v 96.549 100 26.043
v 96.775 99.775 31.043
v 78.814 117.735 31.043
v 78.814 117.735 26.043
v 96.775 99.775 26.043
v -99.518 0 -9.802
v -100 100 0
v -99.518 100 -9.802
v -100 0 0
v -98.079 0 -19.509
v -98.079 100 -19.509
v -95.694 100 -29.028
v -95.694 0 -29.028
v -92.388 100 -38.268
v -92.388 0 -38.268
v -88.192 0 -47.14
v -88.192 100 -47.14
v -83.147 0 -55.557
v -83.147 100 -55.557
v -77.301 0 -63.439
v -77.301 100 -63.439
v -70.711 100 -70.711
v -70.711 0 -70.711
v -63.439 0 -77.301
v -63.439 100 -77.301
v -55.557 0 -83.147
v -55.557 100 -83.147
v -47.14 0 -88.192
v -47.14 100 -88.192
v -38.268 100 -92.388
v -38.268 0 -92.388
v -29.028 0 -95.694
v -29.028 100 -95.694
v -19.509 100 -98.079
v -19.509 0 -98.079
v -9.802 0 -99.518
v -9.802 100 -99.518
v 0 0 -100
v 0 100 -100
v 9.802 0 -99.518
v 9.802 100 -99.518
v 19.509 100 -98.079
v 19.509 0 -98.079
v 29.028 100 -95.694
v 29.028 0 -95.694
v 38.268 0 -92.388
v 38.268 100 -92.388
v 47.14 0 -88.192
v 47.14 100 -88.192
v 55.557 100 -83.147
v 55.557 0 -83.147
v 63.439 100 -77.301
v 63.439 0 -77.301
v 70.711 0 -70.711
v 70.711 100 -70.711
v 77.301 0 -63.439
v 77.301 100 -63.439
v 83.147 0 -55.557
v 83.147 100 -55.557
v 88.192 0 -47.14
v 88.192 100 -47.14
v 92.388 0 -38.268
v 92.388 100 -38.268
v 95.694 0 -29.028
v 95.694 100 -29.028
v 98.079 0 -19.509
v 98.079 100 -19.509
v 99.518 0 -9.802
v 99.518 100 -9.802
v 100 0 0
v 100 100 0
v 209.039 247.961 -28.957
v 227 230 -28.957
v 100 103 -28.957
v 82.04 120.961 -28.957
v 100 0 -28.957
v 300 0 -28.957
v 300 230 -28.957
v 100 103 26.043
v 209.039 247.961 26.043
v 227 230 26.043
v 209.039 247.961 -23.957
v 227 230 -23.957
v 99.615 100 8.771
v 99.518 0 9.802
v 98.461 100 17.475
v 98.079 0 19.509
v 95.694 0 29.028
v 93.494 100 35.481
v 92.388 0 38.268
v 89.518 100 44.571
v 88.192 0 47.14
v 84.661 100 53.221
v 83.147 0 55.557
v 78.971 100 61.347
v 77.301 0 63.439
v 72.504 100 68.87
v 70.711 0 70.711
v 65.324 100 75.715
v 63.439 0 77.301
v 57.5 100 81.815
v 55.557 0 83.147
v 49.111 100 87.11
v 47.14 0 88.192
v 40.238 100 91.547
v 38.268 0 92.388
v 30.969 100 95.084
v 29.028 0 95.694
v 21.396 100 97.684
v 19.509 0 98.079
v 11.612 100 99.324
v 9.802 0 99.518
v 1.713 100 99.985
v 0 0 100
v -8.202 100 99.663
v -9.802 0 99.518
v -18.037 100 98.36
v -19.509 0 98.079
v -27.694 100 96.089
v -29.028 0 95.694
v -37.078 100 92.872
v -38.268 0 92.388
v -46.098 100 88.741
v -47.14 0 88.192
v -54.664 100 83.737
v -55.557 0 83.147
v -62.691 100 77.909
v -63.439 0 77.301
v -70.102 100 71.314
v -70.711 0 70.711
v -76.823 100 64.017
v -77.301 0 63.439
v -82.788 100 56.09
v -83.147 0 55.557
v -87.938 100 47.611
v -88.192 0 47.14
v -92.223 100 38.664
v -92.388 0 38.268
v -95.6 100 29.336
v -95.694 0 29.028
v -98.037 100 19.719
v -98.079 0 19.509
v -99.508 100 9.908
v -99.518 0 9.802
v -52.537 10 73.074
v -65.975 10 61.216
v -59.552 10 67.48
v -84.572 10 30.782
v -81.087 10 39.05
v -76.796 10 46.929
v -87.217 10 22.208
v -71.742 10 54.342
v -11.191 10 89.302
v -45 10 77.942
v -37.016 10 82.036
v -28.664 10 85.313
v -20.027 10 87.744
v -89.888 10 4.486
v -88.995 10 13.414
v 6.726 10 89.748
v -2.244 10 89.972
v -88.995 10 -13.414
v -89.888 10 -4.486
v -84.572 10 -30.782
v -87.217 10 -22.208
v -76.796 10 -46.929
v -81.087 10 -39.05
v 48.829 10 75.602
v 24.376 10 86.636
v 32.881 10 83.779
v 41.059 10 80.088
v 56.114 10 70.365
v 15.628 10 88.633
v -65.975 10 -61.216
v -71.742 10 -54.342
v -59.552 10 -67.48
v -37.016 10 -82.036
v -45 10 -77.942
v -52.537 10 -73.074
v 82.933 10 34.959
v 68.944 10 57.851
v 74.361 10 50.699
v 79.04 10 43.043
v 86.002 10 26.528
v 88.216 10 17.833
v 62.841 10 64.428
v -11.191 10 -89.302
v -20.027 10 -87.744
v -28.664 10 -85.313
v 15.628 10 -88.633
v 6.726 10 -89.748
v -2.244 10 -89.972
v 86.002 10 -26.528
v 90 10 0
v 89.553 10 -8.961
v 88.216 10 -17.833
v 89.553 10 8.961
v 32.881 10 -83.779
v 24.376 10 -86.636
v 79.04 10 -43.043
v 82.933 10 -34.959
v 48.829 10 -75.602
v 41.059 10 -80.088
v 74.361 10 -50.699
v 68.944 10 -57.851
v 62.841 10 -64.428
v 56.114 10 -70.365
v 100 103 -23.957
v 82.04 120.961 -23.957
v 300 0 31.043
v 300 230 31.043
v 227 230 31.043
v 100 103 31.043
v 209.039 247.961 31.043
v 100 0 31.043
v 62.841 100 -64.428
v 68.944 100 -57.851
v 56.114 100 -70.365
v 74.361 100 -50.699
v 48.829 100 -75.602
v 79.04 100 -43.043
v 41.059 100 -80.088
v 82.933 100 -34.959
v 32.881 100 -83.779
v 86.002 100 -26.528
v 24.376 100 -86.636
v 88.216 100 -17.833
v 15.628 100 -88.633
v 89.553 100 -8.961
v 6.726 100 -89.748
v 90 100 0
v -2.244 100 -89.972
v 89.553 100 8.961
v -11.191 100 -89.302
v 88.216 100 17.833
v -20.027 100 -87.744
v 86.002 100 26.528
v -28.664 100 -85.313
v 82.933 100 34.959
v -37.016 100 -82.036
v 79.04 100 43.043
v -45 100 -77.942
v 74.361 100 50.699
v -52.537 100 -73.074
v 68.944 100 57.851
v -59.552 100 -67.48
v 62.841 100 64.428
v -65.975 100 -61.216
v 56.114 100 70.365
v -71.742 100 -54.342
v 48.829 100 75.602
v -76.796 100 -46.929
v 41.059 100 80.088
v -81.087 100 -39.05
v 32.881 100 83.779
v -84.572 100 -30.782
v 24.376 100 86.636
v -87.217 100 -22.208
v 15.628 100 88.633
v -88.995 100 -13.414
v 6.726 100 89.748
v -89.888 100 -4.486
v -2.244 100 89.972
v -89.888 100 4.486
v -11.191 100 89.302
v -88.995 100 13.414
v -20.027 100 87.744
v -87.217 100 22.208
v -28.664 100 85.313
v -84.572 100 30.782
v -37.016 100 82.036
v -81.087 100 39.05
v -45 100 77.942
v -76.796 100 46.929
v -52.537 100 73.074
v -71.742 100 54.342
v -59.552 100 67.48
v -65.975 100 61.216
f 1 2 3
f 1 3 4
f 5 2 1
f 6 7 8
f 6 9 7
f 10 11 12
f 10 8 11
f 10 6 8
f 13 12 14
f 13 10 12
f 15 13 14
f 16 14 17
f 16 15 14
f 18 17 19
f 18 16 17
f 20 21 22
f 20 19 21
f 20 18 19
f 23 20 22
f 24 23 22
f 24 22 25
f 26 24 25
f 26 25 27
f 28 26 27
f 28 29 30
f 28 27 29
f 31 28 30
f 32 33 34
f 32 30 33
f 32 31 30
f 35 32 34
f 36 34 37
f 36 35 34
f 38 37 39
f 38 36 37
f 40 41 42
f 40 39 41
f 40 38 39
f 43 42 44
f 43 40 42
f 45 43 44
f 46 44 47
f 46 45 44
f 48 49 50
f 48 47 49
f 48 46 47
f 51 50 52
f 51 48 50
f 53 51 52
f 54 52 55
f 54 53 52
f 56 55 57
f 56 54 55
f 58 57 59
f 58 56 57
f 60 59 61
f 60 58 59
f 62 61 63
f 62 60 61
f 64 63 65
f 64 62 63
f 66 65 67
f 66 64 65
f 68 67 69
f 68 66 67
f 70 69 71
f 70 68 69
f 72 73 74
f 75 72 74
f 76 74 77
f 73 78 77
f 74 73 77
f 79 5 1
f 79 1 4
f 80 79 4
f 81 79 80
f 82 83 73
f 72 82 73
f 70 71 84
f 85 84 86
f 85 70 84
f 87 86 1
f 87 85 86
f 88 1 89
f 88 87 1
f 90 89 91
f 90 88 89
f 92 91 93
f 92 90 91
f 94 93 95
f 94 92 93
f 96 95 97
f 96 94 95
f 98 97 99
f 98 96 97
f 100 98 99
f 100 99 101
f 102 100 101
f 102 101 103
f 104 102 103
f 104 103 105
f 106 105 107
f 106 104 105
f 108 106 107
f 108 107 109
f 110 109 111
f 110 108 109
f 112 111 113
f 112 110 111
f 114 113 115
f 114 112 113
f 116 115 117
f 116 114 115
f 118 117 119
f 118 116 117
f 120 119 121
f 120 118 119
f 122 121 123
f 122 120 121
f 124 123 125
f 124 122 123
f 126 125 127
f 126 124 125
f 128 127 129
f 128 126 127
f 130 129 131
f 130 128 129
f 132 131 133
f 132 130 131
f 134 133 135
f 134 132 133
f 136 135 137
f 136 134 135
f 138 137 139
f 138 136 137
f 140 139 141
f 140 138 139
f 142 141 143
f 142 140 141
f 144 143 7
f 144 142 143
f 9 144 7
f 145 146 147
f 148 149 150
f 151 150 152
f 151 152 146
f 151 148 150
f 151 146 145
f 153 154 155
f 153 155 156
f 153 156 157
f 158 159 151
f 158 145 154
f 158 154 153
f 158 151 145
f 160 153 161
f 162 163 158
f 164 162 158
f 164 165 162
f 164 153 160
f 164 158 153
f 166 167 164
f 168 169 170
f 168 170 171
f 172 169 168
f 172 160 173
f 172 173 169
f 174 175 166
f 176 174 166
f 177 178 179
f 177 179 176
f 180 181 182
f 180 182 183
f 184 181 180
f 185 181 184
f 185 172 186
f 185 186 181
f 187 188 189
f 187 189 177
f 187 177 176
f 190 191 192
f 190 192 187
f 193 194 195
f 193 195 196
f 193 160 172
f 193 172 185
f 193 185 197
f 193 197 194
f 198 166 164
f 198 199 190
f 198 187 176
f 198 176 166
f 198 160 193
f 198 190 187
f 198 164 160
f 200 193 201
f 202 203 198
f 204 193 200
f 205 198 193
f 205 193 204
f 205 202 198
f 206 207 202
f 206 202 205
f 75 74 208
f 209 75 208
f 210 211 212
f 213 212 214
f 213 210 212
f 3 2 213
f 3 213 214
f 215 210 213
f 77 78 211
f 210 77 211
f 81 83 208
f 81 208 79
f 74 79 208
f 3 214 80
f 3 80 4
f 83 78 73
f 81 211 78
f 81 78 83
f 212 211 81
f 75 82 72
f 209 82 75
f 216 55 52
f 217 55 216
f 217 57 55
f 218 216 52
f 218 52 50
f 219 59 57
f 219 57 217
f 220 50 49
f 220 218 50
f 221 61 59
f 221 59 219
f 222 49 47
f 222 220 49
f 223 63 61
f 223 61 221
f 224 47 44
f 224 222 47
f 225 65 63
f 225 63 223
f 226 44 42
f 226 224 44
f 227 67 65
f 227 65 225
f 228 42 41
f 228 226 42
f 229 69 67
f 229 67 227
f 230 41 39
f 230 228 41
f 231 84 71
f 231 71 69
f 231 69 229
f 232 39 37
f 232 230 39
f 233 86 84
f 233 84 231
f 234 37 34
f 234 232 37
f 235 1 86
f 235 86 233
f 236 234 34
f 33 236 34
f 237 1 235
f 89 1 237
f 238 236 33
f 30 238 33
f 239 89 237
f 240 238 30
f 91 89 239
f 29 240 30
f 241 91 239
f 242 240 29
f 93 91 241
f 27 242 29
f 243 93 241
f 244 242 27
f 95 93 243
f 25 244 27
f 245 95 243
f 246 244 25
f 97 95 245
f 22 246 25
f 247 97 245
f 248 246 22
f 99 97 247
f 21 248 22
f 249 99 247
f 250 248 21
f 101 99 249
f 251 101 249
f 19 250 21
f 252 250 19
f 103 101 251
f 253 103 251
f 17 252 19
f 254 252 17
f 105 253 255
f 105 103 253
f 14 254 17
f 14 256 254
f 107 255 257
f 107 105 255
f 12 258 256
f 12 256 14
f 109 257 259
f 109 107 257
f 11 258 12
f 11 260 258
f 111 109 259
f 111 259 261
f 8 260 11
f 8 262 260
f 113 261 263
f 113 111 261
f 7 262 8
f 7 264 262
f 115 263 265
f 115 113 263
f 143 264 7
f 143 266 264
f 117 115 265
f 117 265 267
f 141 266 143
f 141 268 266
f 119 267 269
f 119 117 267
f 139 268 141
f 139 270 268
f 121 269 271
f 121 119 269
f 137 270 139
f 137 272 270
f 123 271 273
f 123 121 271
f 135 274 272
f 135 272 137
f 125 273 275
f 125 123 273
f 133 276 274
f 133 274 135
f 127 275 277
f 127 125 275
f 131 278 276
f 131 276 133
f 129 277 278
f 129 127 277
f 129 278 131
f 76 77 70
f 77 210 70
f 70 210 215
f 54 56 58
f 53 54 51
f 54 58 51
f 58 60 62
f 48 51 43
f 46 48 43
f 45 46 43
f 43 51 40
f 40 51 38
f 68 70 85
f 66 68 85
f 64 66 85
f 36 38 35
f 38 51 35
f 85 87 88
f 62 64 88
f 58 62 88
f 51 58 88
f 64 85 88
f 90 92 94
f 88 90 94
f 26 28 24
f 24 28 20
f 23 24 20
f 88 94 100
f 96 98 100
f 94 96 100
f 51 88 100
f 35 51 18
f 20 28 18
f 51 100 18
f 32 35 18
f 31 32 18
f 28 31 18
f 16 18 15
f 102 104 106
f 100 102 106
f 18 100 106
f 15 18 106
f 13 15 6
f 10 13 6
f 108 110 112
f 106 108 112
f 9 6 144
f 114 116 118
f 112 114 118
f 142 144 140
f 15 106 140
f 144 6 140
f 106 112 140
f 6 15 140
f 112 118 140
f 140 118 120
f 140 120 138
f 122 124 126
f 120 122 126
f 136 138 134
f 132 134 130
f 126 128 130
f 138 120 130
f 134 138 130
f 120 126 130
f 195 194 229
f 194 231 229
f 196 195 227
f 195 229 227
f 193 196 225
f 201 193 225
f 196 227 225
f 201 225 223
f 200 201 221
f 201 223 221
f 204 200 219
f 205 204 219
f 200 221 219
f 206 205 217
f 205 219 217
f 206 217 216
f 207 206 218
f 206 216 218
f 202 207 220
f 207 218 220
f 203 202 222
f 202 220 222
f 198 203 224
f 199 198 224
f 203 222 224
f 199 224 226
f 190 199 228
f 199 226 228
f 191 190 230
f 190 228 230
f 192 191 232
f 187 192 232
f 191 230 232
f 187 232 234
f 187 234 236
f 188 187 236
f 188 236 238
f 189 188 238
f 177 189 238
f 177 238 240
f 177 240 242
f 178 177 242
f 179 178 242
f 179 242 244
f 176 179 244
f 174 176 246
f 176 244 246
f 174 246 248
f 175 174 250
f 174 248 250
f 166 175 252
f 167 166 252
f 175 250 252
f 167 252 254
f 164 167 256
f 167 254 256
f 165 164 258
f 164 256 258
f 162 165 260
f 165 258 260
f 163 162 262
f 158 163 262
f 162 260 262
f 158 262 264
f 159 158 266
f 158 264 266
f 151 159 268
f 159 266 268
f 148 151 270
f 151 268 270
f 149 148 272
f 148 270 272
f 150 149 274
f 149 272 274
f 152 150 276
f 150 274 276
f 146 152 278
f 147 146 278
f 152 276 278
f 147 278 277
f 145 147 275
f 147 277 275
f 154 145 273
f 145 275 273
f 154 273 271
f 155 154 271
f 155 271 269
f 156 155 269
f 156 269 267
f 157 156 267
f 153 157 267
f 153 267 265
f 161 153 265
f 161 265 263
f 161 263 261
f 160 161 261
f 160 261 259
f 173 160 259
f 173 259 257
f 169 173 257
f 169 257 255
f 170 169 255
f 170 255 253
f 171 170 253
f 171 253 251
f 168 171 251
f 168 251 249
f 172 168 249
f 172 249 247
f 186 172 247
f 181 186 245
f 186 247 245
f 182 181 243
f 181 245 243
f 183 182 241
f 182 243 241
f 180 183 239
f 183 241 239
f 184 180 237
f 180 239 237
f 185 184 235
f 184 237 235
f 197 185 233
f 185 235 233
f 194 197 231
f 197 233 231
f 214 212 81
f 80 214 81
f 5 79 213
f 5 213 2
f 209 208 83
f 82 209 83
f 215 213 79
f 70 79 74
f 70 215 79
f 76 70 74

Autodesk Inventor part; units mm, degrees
ref_plane "YZ Plane" through (0, 0, 0) normal (1, 0, 0) x (0, 1, 0)
ref_plane "XZ Plane" through (0, 0, 0) normal (0, 1, 0) x (-1, 0, 0)
ref_plane "XY Plane" through (0, 0, 0) normal (0, 0, 1) x (1, 0, 0)
sketch "Sketch1" plane through (0, 0, 0) normal (0, 1, 0) x (-1, 0, 0)
  circle A0 centre (0, 0) radius 100
  dimension "d0" = 100
extrude "Extrusion1" add sketch "Sketch1" along normal blind 100
sketch "Sketch2" plane through (0, 100, 0) normal (0, 1, 0) x (1, 0, 0)
  circle A0 centre (0, 0) radius 90
  dimension "d3" = 90
extrude "Extrusion2" cut sketch "Sketch2" against normal blind 90
sketch "Sketch3" plane through (0, 100, 0) normal (0, 1, 0) x (1, 0, 0)
  point P0 (0, 0)
sketch "Sketch4" plane through (0, 0, 0) normal (0, 0, 1) x (1, 0, 0)
  line L0 (100, 0) -> (100, 100) projected
  line L1 (100, 0) -> (-100, 0) projected
  line L2 (100, 100) -> (100, 0)
  point P0 (0, 0)
sketch "Sketch5" plane through (0, 0, 0) normal (0, 1, 0) x (-1, 0, 0)
  circle A0 centre (0, 0) radius 100 projected
  line L0 (-95.5, 30.3394) -> (-95.5, 30.3394)
  circle A1 centre (0, 0) radius 100 projected
  line L1 (-100, 0) -> (-100, 30)
  line L2 (-100, 30) -> (-100, -30)
  dimension "d12" = 30
  dimension "d13" = 60
sketch "Sketch6" plane through (0, 0, 0) normal (1, 0, 0) x (0, 1, 0)
  point P0 (0, 0)
sketch "Sketch7" plane through (0, 0, 0) normal (1, 0, 0) x (0, 1, 0)
  point P0 (0, 0)
sketch "Sketch8" plane through (0, 0, 0) normal (0, 0, 1) x (1, 0, 0)
  line L0 (71.0018, -29.5169) -> (371.0018, -29.5169) construction
  point P0 (0, 0)
sketch "Sketch9" plane through (0, 0, 0) normal (1, 0, 0) x (0, 1, 0)
  point P0 (0, 0)
sketch "Sketch10" plane through (0, 0, 0) normal (1, 0, 0) x (0, 1, 0)
  point P0 (0, 0)
sketch "Sketch11" plane through (0, 100, 0) normal (0, 1, 0) x (1, 0, 0)
  point P0 (0, 0)
sketch "Sketch12" plane through (0, 0, 0) normal (0, 1, 0) x (-1, 0, 0)
  line L0 (-100, -28.9567) -> (-300, -28.9567)
  line L1 (-300, -28.9567) -> (-300, 31.0433)
  line L2 (-300, 31.0433) -> (-100, 31.0433)
  line L3 (-100, 31.0433) -> (-100, -28.9567)
  point P0 (0, 0)
  dimension "d16" = 200
  dimension "d17" = 60
extrude "Extrusion3" add sketch "Sketch12" along normal blind 230
sketch "Sketch13" plane through (100, 0, 31.0433) normal (0, 0, 1) x (1, 0, 0)
  line L0 (0, 0) -> (-200, 0) projected
  line L1 (0, 0) -> (200, 200)
  line L2 (200, 0) -> (200, 230) projected
  line L3 (0, 0) -> (282.8427, 0) construction
  line L4 (0, 103.2812) -> (126.7188, 230)
  line L5 (0, 230) -> (200, 230) projected
  line L6 (126.7188, 230) -> (200, 230)
  line L7 (200, 200) -> (0, 0)
  line L8 (0, 103.2812) -> (126.7188, 230)
  point P0 (-100, 0)
  dimension "d20" = 45
chamfer "Chamfer1" distance 127 angle 45 1 edges at (100, 230, 1.0433)
sketch "Sketch14" plane through (227, 230, -28.9567) normal (-0.7071, 0.7071, 0) x (-0.7071, -0.7071, 0)
  line L0 (0, 0) -> (179.6051, 0) projected
  line L1 (179.6051, 0) -> (179.6051, 60) projected
  line L2 (0, 0) -> (179.6051, 0)
  line L3 (179.6051, 0) -> (179.6051, 5)
  line L4 (179.6051, 5) -> (0, 5)
  line L5 (0, 5) -> (0, 0)
  line L6 (0, 60) -> (0, 0) projected
  ellipse E0 centre (252.4371, 28.9567) end of major axis (252.4371, 128.9567) minor radius 70.7107 projected
  line L7 (0, 60) -> (184.1665, 60)
  line L8 (184.1665, 60) -> (184.1665, 55)
  line L9 (184.1665, 55) -> (0, 55)
  line L10 (0, 55) -> (0, 60)
  point P0 (323.1478, 28.9567)
  point P1 (181.7264, 28.9567)
  point P2 (0, 55)
  dimension "d24" = 5
  dimension "d25" = 5
extrude "Extrusion4" add sketch "Sketch14" along normal blind 25.4 contours L6 L7 L1 L9 | L1 L7 L8 L9
sketch "Sketch15" plane through (227, 230, -28.9567) normal (-0.7071, 0.7071, 0) x (-0.7071, -0.7071, 0)
  line L0 (-51.6188, 0) -> (0, 0) projected
  line L1 (179.6051, 0) -> (179.6051, 55) projected
  line L2 (0, 0) -> (179.6051, 0)
  line L3 (179.6051, 0) -> (179.6051, 5)
  line L4 (179.6051, 5) -> (0, 5)
  line L5 (0, 5) -> (0, 0)
  point P0 (323.1478, 28.9567)
  point P1 (179.6051, 0)
  dimension "d28" = 5
extrude "Extrusion5" add sketch "Sketch15" along normal blind 25.4
properties part number "inclined container"
